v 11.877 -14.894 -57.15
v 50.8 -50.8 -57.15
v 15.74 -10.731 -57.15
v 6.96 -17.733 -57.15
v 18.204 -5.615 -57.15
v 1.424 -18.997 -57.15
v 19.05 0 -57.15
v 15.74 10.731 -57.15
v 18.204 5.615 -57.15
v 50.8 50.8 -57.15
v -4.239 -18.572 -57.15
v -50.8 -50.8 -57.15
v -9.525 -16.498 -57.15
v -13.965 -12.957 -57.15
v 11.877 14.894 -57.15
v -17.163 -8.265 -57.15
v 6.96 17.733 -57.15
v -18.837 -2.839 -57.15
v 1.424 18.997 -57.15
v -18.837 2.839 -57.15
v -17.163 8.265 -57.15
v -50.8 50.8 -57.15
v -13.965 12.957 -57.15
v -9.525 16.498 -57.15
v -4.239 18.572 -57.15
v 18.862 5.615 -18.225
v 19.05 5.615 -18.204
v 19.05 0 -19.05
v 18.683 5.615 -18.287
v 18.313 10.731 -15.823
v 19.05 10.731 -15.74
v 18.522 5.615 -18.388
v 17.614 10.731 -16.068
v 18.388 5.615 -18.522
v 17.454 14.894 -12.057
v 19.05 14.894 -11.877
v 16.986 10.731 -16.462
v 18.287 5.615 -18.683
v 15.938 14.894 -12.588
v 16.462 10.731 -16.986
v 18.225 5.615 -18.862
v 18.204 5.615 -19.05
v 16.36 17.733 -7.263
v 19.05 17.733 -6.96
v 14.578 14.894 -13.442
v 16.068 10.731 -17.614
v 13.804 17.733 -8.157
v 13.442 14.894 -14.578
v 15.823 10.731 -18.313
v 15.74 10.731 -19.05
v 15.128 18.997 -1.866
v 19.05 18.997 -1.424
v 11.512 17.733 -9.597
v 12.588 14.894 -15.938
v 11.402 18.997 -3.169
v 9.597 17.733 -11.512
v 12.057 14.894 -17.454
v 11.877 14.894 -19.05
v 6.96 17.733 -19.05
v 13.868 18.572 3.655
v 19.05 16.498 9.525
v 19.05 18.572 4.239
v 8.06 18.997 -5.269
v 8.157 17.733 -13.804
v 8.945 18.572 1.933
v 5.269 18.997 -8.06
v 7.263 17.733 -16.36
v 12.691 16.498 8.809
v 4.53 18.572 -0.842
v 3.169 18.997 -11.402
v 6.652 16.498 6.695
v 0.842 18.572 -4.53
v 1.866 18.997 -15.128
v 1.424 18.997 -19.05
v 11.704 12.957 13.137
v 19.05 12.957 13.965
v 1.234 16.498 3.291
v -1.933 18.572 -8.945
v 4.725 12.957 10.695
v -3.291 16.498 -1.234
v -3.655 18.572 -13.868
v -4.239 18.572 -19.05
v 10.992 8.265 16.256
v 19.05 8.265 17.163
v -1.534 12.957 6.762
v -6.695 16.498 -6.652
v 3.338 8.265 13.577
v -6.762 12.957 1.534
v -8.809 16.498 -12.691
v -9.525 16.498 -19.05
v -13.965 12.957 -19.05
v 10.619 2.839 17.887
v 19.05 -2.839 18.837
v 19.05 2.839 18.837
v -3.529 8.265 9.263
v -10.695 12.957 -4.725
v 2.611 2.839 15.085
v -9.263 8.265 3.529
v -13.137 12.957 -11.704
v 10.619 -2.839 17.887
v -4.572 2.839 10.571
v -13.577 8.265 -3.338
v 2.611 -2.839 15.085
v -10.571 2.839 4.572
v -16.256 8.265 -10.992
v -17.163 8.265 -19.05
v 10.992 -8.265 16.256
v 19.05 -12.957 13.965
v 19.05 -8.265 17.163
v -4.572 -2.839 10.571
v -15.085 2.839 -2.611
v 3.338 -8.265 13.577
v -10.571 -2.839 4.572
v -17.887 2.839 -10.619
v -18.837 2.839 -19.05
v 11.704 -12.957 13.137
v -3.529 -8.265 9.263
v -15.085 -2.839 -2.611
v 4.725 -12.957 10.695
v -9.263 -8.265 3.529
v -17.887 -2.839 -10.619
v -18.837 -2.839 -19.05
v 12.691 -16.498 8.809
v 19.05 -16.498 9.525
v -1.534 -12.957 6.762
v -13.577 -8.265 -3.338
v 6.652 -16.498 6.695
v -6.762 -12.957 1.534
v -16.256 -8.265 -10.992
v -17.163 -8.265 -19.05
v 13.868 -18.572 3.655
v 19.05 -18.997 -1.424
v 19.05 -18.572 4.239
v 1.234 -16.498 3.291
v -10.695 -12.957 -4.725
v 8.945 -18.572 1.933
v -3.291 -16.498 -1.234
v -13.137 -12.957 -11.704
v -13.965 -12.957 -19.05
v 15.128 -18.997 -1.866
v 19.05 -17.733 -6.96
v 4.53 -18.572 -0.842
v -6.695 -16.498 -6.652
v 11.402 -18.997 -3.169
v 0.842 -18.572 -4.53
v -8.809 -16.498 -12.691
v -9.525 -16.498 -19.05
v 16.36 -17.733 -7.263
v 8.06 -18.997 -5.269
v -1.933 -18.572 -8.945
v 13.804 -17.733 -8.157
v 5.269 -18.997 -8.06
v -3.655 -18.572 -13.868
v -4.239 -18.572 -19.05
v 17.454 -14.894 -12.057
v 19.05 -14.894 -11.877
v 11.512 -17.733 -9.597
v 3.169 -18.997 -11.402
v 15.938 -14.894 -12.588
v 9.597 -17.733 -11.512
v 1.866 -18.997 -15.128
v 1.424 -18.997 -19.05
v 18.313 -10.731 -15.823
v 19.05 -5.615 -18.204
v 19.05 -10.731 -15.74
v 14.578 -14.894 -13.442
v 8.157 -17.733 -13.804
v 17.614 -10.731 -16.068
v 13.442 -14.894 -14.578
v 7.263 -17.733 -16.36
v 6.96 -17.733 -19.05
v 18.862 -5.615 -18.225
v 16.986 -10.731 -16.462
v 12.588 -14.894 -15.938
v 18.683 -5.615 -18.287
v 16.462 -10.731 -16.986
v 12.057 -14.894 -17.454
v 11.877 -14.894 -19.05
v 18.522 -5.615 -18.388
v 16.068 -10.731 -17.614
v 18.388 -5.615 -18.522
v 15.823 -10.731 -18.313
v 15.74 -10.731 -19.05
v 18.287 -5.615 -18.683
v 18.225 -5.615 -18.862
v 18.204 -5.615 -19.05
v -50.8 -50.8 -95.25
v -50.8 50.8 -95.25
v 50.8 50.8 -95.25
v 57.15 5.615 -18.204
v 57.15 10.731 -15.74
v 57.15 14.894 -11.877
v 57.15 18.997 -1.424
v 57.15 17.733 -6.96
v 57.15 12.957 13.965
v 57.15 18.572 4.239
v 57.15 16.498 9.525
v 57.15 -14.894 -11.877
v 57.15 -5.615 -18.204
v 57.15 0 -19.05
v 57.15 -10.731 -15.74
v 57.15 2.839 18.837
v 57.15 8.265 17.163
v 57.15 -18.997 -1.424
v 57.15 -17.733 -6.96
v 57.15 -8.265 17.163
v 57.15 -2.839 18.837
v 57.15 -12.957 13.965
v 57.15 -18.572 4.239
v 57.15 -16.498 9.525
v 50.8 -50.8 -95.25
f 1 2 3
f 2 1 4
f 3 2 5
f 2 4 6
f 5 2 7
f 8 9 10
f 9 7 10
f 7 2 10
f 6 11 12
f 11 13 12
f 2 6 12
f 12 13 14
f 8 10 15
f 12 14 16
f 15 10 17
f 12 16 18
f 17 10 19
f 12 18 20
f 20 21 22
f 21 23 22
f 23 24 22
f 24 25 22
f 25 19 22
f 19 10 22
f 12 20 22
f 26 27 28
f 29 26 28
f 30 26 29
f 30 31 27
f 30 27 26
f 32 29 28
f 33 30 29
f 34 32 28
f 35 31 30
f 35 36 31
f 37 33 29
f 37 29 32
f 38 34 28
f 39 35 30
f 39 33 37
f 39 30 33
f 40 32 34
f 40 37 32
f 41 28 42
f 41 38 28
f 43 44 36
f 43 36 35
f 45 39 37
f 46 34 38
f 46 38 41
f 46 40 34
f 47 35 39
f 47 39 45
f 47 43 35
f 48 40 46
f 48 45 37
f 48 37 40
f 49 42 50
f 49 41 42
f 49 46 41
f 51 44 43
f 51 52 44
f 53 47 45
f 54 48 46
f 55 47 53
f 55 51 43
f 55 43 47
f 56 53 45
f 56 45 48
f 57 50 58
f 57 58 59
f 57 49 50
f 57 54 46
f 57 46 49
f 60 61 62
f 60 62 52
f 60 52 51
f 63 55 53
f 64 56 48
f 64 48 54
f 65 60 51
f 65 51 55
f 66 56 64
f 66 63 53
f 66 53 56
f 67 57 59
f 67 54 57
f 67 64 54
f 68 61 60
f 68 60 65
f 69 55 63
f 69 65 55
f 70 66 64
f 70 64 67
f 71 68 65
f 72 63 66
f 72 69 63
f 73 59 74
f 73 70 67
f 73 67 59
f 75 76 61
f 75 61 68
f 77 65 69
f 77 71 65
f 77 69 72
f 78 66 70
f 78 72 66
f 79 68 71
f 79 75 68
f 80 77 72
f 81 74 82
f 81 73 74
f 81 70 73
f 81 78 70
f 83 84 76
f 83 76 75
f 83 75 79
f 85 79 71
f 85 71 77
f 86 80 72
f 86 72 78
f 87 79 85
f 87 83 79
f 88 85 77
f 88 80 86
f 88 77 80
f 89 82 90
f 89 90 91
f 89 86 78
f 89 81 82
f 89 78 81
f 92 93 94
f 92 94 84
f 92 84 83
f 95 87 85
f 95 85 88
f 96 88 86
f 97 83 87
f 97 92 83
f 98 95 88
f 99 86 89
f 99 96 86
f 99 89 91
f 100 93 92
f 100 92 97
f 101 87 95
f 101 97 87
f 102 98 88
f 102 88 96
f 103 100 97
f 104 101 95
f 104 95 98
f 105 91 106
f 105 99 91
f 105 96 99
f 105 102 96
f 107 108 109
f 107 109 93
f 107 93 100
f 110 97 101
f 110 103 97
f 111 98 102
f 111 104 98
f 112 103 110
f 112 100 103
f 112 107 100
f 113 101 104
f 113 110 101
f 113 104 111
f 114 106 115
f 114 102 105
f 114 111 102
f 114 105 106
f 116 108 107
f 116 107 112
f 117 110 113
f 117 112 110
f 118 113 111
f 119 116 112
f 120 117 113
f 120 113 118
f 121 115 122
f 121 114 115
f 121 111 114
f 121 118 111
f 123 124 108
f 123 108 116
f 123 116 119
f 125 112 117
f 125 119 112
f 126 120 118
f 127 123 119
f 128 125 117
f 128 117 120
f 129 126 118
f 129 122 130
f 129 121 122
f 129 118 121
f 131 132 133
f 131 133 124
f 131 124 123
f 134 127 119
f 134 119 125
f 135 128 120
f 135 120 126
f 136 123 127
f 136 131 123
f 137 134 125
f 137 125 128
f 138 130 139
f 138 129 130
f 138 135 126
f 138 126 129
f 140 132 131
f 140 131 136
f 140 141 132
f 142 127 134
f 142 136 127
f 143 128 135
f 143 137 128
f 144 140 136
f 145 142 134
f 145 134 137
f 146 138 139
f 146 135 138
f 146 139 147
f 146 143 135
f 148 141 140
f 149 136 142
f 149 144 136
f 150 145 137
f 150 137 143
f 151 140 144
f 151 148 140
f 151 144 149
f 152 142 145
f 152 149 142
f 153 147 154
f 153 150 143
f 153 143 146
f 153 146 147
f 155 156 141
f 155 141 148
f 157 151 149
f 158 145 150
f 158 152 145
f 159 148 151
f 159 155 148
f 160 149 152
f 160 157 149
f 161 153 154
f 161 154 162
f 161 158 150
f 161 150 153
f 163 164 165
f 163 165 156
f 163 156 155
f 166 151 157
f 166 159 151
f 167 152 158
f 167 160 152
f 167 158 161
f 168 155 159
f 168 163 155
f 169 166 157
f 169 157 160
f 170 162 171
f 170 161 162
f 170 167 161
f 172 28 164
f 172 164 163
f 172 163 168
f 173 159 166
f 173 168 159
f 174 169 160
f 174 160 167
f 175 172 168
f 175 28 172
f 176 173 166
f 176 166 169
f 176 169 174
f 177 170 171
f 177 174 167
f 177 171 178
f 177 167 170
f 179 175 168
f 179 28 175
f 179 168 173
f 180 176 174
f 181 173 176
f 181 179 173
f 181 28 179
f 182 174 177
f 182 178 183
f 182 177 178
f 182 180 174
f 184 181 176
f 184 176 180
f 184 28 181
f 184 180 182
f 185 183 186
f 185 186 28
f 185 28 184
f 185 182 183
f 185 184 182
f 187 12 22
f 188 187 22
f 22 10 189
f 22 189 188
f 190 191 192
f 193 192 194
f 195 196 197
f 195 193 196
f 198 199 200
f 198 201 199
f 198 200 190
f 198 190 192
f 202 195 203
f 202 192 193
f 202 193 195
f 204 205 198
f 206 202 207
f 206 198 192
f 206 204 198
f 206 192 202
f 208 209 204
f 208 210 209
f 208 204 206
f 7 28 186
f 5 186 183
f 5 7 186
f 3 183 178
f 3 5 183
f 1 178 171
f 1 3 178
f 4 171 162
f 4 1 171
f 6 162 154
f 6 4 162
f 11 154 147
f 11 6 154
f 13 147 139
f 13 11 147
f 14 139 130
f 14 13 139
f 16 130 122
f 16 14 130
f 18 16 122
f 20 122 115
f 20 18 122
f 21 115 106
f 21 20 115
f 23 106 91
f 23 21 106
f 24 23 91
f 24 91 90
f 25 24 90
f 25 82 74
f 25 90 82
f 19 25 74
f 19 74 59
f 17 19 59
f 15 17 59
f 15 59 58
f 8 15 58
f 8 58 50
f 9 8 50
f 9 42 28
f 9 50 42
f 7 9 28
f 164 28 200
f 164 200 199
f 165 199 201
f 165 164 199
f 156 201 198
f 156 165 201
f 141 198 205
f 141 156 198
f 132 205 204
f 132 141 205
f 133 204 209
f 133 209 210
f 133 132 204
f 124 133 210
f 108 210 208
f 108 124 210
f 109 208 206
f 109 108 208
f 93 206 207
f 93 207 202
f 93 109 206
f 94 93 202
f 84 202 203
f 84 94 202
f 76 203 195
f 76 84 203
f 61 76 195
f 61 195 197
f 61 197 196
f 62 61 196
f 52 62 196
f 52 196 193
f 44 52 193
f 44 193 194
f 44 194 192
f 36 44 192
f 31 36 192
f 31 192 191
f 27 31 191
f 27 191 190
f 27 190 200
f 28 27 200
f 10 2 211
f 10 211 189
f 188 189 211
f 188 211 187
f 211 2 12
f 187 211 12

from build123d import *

# Parameters (mm, degrees)
SKETCH2_R           = 19.05
SKETCH3_W           = 101.6
SKETCH3_H           = 101.6
BOSS_EXTRUDE1_DEPTH = 38.1


with BuildPart() as part:
    # Sweep1: sweep along a path in Sketch1
    with BuildLine(Plane(origin=(0, 0, 0), x_dir=(1, 0, 0), z_dir=(0, 1, 0))) as sweep1_path:
        Line((57.15, 0), (19.05, 0))
        ThreePointArc((19.05, 0), (5.579615818, 5.579615818), (0, 19.05))
        Line((0, 19.05), (0, 57.15))
    # Sketch2 → Sweep1 (sweep)
    with BuildSketch(Plane(origin=(57.15, 0, 0), x_dir=(0, 0, -1), z_dir=(1, 0, 0))):
        Circle(SKETCH2_R)
    sweep(path=sweep1_path.line)

    # Sketch3 → Boss-Extrude1 (add)
    with BuildSketch(Plane(origin=(0, 0, -57.15), x_dir=(-1, 0, 0), z_dir=(0, 0, -1))):
        Rectangle(SKETCH3_W, SKETCH3_H)
    extrude(amount=BOSS_EXTRUDE1_DEPTH)


solid = part.part
